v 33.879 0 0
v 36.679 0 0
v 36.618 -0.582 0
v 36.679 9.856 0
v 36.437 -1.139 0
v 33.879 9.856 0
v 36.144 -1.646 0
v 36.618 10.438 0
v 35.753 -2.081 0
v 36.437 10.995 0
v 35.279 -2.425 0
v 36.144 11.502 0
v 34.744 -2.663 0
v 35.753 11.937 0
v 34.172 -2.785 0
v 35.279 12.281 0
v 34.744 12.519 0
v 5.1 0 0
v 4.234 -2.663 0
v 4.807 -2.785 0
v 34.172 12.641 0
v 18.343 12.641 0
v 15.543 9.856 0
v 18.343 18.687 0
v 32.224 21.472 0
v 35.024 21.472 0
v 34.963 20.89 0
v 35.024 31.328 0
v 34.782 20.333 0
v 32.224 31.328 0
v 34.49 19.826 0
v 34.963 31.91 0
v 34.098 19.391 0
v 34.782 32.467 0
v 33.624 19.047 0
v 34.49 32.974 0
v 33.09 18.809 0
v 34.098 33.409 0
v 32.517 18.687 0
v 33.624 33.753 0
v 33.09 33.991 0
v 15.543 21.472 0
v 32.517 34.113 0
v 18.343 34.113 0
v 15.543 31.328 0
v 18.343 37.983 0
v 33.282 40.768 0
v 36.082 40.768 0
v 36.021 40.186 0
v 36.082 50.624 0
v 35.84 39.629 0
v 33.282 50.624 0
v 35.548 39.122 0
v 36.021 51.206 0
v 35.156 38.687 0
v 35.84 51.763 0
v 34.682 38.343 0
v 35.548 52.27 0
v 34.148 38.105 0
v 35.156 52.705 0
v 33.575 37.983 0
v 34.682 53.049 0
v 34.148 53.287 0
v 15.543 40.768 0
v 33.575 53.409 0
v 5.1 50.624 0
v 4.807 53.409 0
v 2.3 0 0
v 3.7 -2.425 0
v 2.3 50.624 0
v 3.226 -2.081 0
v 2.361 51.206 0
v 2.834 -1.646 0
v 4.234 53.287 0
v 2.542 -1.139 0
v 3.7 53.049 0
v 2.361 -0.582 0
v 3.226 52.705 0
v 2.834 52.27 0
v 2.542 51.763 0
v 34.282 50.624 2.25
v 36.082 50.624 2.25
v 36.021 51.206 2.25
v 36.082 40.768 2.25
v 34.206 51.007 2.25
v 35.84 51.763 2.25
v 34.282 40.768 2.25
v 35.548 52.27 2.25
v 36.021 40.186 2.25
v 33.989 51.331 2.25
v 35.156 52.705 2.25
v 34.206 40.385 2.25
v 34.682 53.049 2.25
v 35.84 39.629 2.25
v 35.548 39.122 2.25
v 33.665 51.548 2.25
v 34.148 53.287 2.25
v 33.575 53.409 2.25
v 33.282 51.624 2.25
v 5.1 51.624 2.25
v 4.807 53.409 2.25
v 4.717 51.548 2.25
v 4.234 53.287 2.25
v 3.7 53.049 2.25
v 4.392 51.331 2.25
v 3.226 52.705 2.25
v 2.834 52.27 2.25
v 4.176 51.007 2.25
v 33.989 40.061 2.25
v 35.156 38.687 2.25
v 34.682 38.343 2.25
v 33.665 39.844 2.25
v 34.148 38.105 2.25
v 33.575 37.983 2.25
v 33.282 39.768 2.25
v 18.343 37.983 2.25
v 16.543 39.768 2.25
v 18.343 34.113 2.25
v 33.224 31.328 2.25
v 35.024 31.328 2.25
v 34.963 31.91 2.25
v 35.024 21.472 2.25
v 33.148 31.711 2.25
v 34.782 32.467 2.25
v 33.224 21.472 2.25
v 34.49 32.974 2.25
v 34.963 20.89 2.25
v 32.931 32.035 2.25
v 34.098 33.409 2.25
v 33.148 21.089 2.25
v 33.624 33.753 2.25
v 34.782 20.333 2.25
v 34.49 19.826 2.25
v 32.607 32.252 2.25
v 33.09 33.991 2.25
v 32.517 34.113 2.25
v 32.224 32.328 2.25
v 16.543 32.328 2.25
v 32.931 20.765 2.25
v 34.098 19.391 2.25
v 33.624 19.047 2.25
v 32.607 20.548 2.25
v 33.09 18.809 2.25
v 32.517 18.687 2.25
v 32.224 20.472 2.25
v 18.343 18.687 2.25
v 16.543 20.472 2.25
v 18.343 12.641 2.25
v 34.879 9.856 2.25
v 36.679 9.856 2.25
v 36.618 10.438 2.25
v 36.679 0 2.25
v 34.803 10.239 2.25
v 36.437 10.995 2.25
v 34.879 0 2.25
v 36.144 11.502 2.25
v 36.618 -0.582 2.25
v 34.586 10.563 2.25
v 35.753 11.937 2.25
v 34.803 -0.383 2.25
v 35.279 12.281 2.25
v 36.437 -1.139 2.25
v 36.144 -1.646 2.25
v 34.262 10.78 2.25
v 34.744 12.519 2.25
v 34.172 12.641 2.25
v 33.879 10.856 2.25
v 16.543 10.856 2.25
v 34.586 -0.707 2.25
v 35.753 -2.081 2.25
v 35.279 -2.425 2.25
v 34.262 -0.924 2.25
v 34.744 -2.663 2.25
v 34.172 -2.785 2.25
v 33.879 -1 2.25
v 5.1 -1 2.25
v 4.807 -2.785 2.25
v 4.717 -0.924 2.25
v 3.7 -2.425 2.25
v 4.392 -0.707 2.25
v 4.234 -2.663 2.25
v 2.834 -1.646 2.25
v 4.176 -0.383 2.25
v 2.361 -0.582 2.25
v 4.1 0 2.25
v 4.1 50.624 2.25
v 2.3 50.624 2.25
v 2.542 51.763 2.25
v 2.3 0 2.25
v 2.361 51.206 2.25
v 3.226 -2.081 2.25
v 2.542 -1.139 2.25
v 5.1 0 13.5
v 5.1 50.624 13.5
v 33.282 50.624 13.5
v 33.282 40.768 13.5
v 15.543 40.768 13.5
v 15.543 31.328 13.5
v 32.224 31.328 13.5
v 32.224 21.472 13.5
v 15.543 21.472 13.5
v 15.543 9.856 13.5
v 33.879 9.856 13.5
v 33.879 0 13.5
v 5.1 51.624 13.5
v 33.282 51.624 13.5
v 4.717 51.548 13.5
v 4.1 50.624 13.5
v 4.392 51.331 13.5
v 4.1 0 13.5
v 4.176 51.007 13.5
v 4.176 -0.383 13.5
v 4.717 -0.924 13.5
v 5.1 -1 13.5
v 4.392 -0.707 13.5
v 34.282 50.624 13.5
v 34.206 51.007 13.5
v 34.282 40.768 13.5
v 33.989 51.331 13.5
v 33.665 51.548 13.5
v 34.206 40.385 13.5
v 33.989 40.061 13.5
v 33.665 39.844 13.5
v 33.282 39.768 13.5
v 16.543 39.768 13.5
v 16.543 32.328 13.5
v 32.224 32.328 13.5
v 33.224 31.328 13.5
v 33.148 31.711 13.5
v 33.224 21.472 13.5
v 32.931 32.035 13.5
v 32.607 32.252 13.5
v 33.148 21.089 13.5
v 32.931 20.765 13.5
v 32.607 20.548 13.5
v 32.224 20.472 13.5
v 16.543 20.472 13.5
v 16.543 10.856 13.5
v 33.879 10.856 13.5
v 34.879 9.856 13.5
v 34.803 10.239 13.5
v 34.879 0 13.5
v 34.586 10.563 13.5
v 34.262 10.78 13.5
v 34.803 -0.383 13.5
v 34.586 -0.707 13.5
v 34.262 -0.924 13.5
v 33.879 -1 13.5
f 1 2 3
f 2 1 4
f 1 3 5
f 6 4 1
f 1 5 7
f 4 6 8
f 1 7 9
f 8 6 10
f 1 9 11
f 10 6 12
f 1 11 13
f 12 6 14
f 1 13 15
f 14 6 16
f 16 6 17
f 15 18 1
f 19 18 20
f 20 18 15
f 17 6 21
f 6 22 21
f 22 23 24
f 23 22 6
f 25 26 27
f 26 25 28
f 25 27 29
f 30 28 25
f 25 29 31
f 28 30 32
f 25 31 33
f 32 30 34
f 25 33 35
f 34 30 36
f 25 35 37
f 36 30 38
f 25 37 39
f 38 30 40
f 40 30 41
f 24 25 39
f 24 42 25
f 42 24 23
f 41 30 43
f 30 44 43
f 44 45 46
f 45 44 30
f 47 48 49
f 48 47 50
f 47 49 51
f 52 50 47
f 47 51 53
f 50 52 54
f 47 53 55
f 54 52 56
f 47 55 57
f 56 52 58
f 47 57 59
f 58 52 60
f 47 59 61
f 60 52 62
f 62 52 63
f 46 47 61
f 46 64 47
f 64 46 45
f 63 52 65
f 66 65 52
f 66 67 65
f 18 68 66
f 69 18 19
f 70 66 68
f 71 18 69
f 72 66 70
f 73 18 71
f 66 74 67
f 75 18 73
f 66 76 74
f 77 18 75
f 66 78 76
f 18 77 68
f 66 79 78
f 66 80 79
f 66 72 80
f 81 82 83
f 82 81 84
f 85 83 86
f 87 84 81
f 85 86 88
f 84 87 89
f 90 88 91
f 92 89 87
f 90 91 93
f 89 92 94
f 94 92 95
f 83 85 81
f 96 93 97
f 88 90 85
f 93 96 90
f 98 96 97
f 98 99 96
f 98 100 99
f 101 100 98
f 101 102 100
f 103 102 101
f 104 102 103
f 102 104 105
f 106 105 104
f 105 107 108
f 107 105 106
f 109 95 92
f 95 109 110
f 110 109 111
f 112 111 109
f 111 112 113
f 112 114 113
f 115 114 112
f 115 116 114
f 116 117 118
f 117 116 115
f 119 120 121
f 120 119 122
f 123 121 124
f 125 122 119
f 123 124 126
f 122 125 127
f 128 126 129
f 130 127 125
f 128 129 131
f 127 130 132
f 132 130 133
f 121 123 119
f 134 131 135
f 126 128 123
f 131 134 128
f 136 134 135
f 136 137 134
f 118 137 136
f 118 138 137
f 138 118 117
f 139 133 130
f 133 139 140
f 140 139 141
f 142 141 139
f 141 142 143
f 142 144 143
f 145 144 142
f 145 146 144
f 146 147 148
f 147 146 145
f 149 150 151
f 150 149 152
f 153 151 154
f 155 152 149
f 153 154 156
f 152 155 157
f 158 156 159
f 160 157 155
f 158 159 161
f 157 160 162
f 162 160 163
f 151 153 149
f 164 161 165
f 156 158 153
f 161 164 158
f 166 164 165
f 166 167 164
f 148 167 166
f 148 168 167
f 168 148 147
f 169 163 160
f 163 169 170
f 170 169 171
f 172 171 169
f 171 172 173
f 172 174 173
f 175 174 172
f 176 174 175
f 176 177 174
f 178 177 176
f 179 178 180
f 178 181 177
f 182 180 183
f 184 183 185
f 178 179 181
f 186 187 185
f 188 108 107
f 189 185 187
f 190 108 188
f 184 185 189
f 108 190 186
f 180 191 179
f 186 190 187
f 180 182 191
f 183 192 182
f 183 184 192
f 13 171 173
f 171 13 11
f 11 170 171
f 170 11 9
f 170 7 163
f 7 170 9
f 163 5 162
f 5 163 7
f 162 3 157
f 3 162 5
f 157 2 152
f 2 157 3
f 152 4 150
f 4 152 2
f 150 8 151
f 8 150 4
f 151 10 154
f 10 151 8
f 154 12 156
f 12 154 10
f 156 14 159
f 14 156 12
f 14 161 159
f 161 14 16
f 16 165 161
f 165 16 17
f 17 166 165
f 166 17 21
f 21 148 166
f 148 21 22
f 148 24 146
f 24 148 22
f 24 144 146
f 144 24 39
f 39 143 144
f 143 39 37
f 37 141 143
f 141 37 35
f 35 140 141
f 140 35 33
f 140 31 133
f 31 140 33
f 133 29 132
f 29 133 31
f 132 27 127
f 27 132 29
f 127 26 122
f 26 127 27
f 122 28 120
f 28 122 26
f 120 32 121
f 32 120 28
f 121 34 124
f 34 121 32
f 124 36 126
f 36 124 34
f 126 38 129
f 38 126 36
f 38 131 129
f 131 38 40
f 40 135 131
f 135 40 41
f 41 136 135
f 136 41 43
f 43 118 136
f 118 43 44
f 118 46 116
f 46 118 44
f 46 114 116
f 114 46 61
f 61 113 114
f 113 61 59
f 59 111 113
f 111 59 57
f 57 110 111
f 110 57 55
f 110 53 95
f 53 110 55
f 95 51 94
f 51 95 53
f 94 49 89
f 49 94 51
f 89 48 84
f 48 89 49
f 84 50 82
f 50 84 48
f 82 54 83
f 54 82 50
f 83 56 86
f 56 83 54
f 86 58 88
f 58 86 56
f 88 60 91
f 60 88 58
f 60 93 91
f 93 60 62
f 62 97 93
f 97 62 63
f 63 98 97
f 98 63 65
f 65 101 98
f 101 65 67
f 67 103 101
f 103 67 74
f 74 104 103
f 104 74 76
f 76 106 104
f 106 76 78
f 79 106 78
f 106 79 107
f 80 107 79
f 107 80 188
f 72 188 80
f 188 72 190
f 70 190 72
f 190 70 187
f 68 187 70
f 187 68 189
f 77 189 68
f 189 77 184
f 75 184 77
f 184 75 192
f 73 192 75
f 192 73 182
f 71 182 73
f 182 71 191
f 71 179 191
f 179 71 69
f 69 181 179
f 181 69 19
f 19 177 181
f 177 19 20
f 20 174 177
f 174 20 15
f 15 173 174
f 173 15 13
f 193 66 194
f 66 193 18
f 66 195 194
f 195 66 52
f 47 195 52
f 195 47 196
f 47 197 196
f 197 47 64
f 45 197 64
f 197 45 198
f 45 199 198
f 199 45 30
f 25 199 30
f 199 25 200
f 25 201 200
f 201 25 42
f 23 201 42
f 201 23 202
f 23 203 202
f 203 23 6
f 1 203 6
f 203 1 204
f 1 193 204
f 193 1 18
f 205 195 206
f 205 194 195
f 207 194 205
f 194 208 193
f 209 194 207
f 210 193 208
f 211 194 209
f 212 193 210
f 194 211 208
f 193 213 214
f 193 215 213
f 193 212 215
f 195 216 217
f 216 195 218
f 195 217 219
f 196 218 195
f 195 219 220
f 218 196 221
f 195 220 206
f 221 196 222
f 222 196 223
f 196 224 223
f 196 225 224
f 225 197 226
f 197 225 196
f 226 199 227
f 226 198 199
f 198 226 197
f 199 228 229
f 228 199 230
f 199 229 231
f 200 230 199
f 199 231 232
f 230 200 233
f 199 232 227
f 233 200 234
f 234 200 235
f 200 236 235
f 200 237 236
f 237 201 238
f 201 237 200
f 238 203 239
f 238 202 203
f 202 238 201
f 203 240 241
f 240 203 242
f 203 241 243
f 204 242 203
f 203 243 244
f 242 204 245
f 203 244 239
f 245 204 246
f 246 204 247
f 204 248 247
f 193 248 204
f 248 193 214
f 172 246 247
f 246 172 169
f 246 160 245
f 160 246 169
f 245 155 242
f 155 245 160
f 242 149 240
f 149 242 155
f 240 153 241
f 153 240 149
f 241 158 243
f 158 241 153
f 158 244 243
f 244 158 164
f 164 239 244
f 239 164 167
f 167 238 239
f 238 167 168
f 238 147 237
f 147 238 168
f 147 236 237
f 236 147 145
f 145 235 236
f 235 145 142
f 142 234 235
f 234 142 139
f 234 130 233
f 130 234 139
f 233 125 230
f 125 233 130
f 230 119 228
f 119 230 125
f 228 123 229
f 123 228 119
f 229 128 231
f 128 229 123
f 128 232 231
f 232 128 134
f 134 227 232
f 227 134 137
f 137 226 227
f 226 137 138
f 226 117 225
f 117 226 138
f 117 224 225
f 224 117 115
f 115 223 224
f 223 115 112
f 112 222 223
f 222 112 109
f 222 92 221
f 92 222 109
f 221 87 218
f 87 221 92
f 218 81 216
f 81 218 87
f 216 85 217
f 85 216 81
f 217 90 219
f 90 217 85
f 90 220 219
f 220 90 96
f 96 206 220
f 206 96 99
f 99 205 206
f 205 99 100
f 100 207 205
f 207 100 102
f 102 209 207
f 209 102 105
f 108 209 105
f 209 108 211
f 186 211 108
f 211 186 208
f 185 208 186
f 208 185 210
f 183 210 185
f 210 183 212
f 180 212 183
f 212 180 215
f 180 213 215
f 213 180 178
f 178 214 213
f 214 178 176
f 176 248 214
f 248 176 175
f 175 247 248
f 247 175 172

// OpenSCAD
// file: Common.scad
module offset_shell(thickness = 0.1) {
  render() {
      difference() {
          minkowski() {
            children();
            circle(2* thickness, center=true);
          }
        children();
      }
   }
}

module cookie_cutter(handle_thickness=8, cutter_tickness=3, total_height=15) {
    union() {
        linear_extrude(height = total_height*(0.15), slices = 60) {
            scale([.2,.2,1]) {
              offset_shell(handle_thickness) {
                children();

              }
            }
        };
        linear_extrude(height = total_height*(0.9), slices = 60)
            translate([0,0,2])
            scale([.2,.2,1]) {
              offset_shell(cutter_tickness) {
                children();
            }
        };
    }
}

module rod_with_clipped_circle(square_d, circle_d, circle_placement) {
    difference() {
        square(square_d, center=true);
        translate(circle_placement) circle(circle_d, center=true);
    }
}

//module cookie_press(handle_thickness=2.5, cutter_tickness=1, total_height=10) {
//    union() {
//        cookie_cutter(handle_thickness, cutter_tickness, total_height);
//        translate([0,0,10]) children();
//    }
//}
//
//
// file: ../ComplexShapes.scad
include <BasicShapes.scad>

module HalfCylinder(r, h, e=1, center=false) {
    translate([0,0, center ? -h/2 : 0])difference(){
        cylinder(h,r,r);
        translate([0,-r,-e])cube([2*r,2*r,h+2*e]);
    }
}

module HalfCircle(r) {
    difference(){
        circle(r);
        translate([-r,-2*r,0]) square(2*r);
    }
}

// http://benjamin-engel.blogspot.com/2015/07/openscad-tips-and-tricks.html

module equilateral_triangle(h) {
    rotate([0,0,-30]) circle(r=h, $fn=3);
}

module Crescent(r, fatten_scale=1, curve_angle=0, rotate=0) {
    r_prime = r / fatten_scale;
    rotate([0,0,rotate]) difference() {
        circle(r_prime*1.1);
        translate([r_prime/4, curve_angle*r_prime/4, 0]) circle(r_prime*fatten_scale);
    }
}


module round_edges(r) {
    minkowski() {
        children();
        circle(r);
    };
}

module CrescentV2(outer_r, inner_r, r_shift, edge_rounding=2) {
    // Different way to construct ... rounded edges ...
   round_edges(edge_rounding) {
        difference() {
            circle(outer_r);
            translate(r_shift) circle(inner_r);
        };
    };
}


//module Arch(x,y,r) {
//    // http://kitwallace.co.uk/Blog/item/2013-01-28T17:59:00Z
//    union() {
//        intersection() {
//           translate([x,y,0]) circle(r);
//           translate([-x,y,0]) circle(r);
//        }
//        translate([0,y/2,0]) square(size=[2 * (r-x), y], center=true);
//    }
//}

module Arch(width, arc_height, strech_height=0) {
    // http://kitwallace.co.uk/Blog/item/2013-01-28T17:59:00Z
    r = arc_height;
    x = (width / 2) - r;
    y = arc_height + strech_height;
    union() {
        intersection() {
           translate([x,y,0]) circle(r);
           translate([-x,y,0]) circle(r);
        }
        translate([0,y/2,0]) square(size=[width, y], center=true);
    }
}
// file: ../BasicShapes.scad
module Star(points, outer, inner_defaulted=0) {
    inner = inner_defaulted == 0 ? 2 * outer  : inner_defaulted;
	// polar to cartesian: radius/angle to x/y
	function x(r, a) = r * cos(a);
	function y(r, a) = r * sin(a);
	
	// angular width of each pie slice of the star
	increment = 360/points;
	
	union() {
		for (p = [0 : points-1]) {
			
			// outer is outer point p
			// inner is inner point following p
			// next is next outer point following p

			assign(	
                x_outer = x(outer, increment * p),
                y_outer = y(outer, increment * p),
                x_inner = x(inner, (increment * p) + (increment/2)),
                y_inner = y(inner, (increment * p) + (increment/2)),
                x_next  = x(outer, increment * (p+1)),
                y_next  = y(outer, increment * (p+1))
            ) {
				polygon(
                    points = [
                        [x_outer, y_outer], 
                        [x_inner, y_inner],
                        [x_next, y_next], 
                        [0, 0]
                    ], 
                    paths  = [[0, 1, 2, 3]]
                );
			}
		}
	}
}

//https://github.com/openscad/MCAD/blob/master/shapes.scad
module Hexagon(size) {
  Star(3, size, size);
}

module Octagon(size) {
  Star(4, size, size);
}

module Decagon(size) {
  Star(5, size, size);
}

module Decagon(size) {
  Star(5, size, size);
}

module Dodecagon(size) {
  Star(6, size, size);
}
// main file
include <../BasicShapes.scad>
include <../ComplexShapes.scad>
include <Common.scad>

cookie_cutter(7,2.5,15) {
    scale([20,25,1]) text("E", font = "Tre:style=Bold");
}
